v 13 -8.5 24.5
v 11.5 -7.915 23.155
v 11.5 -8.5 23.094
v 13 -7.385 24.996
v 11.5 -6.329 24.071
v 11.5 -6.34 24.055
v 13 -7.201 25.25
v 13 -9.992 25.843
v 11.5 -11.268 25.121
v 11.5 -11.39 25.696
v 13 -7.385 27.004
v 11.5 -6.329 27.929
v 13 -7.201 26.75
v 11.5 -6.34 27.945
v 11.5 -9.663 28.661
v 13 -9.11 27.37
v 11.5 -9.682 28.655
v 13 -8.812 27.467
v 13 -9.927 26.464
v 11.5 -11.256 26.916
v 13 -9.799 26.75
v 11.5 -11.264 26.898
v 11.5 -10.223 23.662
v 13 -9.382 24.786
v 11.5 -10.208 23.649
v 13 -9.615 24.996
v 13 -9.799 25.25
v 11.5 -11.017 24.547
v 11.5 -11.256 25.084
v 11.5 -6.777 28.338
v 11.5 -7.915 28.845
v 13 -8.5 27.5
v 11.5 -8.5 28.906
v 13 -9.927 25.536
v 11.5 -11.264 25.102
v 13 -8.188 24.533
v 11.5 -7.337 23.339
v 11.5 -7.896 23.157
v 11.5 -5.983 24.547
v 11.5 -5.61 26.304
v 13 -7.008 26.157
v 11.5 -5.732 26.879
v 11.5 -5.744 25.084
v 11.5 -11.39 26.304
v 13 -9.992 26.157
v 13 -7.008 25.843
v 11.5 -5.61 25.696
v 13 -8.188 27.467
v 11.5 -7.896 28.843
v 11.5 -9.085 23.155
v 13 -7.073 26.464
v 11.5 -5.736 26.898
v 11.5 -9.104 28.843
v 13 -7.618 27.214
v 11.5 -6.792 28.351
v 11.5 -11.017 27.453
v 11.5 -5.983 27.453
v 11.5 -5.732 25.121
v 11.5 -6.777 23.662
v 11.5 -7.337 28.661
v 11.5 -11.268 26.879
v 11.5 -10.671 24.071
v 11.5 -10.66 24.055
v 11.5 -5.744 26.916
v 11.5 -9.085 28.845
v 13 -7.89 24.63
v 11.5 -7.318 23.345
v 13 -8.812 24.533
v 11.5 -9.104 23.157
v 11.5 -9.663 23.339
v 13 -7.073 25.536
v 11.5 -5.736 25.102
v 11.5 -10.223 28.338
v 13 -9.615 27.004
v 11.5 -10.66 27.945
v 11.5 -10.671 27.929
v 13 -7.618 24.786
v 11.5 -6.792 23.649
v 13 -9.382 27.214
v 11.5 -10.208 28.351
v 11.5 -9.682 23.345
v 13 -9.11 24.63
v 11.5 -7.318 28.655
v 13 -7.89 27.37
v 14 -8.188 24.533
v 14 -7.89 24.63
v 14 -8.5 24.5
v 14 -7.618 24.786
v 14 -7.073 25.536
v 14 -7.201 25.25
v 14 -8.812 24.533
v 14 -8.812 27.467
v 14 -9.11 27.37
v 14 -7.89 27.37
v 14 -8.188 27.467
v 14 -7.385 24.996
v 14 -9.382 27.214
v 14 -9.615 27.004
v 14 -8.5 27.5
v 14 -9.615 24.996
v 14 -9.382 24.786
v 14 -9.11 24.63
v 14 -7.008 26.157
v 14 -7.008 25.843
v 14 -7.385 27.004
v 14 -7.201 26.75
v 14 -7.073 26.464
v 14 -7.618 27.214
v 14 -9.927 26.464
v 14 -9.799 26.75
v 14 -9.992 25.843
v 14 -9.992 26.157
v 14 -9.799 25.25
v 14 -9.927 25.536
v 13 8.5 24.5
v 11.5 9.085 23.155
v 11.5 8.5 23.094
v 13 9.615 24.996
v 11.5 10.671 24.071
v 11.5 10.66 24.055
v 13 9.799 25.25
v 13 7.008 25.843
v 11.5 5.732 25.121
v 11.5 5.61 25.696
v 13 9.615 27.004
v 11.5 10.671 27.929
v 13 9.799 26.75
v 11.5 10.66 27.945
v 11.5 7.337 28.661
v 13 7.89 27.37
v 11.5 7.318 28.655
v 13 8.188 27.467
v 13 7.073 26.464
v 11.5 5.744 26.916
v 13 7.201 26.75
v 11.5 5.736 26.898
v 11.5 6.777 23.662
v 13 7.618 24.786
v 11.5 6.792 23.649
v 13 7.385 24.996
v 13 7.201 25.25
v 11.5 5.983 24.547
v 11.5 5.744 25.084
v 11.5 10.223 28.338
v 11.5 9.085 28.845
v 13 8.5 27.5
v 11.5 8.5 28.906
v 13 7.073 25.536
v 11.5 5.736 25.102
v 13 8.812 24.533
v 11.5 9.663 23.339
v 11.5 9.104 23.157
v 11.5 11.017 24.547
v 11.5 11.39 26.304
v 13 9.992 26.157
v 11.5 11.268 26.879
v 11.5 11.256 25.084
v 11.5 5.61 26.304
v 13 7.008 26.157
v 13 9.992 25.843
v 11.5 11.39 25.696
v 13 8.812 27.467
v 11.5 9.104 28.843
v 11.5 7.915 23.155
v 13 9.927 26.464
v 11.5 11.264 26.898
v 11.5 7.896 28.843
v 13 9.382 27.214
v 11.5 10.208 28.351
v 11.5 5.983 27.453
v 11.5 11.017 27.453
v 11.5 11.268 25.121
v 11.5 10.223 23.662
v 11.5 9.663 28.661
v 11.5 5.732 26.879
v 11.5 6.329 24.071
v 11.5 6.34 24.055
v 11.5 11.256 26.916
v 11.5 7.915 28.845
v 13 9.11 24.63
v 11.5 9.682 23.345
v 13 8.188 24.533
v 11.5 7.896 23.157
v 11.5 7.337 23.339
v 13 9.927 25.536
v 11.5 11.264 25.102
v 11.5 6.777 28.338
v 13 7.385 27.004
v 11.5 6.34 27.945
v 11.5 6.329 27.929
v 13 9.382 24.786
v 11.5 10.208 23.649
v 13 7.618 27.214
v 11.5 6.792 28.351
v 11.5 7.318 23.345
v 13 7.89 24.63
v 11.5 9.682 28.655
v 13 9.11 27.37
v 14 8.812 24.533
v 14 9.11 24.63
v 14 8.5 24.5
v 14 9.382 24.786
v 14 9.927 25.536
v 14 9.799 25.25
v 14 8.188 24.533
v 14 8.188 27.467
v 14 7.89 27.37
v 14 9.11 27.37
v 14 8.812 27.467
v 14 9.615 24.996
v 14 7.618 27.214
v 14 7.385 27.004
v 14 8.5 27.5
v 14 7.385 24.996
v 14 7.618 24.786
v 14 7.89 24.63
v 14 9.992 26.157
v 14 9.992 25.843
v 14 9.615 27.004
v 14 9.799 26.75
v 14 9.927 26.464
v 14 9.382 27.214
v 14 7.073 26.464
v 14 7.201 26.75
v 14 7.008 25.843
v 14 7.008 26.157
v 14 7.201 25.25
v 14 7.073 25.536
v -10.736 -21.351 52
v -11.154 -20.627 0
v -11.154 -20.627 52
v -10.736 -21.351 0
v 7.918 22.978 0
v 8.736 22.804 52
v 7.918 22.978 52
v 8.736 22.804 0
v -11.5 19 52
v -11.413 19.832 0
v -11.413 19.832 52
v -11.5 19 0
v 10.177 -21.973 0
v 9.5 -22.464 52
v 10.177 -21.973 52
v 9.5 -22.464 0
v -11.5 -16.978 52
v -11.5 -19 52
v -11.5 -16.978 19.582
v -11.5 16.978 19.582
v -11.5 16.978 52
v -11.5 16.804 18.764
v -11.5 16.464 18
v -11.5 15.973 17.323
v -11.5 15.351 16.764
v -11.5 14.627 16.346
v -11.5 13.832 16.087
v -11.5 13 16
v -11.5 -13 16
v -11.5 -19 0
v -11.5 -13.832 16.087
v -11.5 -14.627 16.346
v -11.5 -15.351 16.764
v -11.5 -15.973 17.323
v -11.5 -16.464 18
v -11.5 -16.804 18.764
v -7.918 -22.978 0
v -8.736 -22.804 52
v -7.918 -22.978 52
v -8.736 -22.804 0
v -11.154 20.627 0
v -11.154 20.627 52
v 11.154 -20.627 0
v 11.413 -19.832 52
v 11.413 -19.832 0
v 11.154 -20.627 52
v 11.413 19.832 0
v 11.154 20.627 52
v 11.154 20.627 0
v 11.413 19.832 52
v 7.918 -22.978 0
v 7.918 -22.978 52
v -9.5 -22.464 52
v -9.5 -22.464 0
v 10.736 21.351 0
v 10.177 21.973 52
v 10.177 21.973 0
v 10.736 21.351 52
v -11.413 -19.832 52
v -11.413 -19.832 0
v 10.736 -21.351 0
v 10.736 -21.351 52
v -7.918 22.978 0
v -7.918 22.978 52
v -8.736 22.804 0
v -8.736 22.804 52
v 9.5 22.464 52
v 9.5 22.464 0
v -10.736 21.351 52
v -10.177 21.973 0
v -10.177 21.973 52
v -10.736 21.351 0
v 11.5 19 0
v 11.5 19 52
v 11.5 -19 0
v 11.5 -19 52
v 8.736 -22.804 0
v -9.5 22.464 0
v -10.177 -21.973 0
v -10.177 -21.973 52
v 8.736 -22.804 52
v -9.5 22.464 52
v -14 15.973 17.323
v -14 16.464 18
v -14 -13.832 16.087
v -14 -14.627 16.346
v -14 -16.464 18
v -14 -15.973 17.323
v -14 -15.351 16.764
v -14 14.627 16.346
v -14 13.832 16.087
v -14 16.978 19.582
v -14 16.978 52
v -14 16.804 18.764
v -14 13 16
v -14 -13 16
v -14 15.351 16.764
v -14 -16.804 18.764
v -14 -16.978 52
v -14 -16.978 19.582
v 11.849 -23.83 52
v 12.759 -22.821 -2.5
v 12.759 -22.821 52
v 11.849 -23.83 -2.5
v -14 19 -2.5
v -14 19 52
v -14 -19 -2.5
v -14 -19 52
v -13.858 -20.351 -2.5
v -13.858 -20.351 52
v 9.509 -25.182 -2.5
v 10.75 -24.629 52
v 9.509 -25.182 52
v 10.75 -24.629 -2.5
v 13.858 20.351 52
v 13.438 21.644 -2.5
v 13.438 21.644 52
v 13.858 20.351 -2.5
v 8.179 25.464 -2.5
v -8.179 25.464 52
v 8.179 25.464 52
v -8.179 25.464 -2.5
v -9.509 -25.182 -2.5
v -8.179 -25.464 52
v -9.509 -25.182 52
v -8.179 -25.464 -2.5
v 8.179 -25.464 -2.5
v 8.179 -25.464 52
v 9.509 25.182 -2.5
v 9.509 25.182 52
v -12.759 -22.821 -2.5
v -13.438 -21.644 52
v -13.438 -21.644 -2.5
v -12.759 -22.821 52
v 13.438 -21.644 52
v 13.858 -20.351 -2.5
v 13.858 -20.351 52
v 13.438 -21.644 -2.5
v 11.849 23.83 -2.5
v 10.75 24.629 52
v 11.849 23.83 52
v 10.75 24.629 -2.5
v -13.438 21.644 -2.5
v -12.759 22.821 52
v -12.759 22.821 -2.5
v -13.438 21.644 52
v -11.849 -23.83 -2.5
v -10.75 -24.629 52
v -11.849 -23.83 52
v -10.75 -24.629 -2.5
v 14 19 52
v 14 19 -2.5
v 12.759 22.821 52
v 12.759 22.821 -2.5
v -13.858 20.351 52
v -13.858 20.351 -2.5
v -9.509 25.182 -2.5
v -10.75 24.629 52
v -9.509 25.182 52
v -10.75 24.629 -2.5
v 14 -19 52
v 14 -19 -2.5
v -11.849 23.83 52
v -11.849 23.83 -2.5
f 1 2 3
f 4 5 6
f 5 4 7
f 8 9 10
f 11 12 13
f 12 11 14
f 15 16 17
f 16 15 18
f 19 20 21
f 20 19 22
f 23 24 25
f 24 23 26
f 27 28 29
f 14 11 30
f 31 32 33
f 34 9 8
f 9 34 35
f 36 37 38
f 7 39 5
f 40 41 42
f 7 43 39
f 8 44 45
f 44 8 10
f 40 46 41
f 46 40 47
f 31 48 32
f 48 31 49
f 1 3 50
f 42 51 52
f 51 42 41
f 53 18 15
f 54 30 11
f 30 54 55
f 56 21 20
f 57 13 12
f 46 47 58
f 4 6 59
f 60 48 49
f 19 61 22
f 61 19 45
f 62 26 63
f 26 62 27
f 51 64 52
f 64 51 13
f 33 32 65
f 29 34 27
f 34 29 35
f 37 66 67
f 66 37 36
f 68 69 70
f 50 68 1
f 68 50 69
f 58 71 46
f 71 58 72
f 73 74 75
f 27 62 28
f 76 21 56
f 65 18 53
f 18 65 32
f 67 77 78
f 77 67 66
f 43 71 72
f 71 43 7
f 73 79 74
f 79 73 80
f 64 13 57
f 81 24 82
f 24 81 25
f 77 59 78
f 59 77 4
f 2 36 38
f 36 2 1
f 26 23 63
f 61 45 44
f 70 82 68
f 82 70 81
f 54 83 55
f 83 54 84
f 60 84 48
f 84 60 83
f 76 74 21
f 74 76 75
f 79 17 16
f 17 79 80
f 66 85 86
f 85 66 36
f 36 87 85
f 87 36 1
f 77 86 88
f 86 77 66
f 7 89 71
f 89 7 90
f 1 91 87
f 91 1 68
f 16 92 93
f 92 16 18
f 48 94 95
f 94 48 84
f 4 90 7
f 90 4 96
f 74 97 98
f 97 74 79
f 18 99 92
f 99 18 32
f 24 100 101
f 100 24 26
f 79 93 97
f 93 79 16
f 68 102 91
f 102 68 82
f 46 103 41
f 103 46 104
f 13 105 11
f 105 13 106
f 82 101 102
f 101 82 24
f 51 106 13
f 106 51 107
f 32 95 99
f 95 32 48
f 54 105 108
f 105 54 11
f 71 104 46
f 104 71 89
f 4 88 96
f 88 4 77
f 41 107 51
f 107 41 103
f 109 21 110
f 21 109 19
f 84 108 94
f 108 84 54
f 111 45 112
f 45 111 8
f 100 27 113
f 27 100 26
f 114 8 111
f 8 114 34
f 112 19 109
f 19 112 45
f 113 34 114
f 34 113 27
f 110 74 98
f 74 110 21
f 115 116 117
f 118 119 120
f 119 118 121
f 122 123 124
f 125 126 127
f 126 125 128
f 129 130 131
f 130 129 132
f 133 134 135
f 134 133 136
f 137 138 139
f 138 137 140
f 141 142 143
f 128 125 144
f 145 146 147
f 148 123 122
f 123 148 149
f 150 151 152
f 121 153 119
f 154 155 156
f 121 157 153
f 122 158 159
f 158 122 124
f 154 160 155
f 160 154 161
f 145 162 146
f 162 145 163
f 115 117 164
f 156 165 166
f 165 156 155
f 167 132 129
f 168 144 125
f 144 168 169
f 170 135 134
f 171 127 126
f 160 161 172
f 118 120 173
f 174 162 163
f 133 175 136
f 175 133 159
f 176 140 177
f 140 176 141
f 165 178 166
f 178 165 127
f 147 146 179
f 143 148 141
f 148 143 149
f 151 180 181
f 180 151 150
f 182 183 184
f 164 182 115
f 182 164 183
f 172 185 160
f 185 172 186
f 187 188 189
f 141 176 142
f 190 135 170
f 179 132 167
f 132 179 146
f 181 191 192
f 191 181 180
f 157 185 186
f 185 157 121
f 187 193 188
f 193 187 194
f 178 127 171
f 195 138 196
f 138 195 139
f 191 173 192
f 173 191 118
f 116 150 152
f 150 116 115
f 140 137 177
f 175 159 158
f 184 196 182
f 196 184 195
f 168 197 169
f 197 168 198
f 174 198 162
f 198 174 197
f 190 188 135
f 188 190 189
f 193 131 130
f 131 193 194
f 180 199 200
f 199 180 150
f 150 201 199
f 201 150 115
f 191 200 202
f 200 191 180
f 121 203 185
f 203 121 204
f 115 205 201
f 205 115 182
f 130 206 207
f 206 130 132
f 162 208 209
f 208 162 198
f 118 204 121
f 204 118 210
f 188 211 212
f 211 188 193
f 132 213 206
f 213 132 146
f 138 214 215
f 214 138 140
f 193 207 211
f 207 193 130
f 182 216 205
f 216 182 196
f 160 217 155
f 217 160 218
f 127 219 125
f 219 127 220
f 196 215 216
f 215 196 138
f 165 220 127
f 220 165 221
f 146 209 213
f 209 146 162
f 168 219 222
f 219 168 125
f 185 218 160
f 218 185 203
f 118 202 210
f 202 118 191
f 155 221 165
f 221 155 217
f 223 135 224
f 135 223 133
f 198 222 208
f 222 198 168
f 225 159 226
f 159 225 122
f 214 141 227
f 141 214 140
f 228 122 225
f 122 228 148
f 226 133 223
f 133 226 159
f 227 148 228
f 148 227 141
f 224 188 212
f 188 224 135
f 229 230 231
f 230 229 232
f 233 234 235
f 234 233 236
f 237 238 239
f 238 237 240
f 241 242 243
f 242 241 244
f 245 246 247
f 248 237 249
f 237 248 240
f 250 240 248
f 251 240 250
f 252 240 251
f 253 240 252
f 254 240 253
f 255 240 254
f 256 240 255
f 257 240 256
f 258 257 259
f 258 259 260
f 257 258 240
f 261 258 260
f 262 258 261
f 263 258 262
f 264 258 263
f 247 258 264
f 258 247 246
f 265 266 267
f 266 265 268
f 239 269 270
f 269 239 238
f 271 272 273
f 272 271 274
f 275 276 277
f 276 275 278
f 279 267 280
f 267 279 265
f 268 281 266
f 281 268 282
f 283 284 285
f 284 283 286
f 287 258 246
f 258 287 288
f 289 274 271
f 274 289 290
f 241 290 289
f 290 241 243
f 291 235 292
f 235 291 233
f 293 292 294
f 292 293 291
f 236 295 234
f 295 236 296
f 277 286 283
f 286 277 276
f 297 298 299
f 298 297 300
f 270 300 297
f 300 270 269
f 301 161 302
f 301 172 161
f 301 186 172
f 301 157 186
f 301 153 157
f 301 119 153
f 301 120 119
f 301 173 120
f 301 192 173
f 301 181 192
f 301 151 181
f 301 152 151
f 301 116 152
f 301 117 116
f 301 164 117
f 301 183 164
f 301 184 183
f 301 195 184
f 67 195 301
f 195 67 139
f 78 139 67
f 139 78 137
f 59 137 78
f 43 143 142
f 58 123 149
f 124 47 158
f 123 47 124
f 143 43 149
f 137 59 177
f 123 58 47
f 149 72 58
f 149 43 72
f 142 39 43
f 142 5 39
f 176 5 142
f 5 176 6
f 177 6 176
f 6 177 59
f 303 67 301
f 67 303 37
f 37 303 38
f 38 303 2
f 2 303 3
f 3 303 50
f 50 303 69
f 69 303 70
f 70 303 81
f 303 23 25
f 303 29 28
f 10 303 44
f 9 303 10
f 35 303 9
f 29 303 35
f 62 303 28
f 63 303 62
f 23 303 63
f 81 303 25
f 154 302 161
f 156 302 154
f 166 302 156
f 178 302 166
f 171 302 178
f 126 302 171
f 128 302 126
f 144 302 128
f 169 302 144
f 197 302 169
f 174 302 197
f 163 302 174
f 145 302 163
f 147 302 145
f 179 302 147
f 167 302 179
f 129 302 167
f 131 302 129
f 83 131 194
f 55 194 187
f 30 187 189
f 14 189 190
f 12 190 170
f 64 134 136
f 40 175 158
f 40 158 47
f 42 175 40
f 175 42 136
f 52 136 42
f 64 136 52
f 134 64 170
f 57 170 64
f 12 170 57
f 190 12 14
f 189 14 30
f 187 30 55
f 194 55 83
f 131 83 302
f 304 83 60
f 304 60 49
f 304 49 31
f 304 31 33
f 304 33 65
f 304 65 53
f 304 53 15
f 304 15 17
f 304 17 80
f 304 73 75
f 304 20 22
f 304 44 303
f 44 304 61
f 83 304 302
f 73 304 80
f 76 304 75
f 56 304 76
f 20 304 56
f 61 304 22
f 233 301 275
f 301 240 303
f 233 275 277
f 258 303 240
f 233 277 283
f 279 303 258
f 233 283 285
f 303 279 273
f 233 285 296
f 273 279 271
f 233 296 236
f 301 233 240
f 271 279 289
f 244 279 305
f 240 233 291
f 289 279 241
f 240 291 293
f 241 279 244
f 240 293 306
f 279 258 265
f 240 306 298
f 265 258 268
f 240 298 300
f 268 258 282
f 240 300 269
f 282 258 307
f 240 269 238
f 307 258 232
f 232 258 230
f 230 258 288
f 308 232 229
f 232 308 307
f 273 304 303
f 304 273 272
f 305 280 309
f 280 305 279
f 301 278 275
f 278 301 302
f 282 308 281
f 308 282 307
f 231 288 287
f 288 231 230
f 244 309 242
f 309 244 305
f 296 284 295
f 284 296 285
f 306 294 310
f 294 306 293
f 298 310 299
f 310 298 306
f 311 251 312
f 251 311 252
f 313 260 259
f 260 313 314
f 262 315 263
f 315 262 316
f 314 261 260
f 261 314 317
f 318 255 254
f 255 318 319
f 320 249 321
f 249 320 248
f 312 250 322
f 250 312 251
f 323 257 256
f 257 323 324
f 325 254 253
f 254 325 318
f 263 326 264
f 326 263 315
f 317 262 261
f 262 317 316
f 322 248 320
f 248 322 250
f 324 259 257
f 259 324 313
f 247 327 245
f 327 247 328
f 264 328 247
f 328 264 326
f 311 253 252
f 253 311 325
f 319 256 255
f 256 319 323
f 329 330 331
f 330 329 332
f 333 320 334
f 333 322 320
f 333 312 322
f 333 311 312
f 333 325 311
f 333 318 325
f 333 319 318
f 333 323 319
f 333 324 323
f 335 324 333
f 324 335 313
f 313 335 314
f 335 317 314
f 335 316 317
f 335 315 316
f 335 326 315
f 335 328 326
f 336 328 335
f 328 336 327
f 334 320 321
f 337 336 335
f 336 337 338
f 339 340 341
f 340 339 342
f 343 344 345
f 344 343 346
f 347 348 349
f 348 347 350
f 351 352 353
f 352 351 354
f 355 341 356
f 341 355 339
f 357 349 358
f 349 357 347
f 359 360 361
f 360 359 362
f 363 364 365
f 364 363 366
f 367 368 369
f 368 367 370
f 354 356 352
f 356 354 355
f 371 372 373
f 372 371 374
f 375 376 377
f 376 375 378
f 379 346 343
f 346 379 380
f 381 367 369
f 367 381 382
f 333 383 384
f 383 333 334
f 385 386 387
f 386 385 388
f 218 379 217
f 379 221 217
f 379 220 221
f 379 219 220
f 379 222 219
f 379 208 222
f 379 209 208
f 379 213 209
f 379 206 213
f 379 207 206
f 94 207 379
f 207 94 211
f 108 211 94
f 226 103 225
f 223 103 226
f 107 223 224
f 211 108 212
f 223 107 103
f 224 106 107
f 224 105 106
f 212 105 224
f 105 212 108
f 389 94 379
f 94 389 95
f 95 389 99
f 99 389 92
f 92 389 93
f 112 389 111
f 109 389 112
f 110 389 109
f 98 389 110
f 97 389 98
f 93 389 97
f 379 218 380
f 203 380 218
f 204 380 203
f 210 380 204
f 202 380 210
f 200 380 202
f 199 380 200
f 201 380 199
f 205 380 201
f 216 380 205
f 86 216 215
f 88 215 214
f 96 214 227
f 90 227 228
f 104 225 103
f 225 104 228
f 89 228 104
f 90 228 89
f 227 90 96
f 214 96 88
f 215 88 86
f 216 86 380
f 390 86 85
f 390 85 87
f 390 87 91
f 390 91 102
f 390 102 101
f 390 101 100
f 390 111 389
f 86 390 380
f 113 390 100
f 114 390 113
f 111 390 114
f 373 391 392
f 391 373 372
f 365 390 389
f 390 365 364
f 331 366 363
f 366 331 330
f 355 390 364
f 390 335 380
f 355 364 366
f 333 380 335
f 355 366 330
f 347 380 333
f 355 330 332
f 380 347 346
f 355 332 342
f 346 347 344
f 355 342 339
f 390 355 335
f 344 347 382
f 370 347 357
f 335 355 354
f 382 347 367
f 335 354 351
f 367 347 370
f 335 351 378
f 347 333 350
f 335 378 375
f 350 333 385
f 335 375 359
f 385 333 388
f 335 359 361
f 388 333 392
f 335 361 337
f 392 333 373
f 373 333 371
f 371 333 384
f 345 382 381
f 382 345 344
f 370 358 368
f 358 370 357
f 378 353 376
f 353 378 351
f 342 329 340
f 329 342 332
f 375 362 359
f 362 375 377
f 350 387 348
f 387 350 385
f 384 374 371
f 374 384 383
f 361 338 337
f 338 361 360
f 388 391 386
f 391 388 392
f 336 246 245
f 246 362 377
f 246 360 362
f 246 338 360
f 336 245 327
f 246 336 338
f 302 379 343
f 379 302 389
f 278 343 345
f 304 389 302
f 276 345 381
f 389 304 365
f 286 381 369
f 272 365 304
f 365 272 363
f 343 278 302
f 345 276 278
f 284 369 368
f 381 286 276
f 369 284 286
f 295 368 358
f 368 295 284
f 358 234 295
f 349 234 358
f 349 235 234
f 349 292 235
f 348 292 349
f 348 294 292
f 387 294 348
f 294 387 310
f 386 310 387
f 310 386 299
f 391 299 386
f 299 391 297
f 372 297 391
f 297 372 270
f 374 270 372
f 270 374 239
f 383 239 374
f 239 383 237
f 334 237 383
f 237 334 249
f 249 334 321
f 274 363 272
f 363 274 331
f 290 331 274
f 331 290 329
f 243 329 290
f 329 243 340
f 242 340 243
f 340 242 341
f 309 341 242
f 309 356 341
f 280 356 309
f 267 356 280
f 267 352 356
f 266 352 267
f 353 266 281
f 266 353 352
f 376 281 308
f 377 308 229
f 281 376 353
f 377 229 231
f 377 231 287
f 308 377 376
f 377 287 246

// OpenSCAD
//
//  wall holder for aircond remote control
//
//  design by egil kvaleberg, 5 october 2016
//
part = "main"; // [ main ]

// size of compartment
comp_w = 46;
comp_d = 23;
comp_h = 52;
// width of front slot
slot_w = 34;
// width of slot lower lip
slot_lower = 16; 
// corner radius of compartment
corner_r = 4;
// wall thickness of comparement
wall = 2.5;
// chamfer for various holes
chamfer = 0.6;
// diameter of mounting screws
mnt_dia = 2.5;

// generic tolerance
tol = 0.25;

d = 1*0.1;

module add() {
    hull() for (sx = [-1,1]) for (sy = [-1,1]) 
        translate([sx*(comp_d/2-corner_r),sy*(comp_w/2-corner_r),-wall]) {
            cylinder(r=wall+corner_r, h=wall+comp_h, $fn=30);
        }     
}

module sub() {
    hull () for (sx = [-1,1]) for (sy = [-1,1]) 
        translate([sx*(comp_d/2-corner_r),sy*(comp_w/2-corner_r),0]) {
            cylinder(r=corner_r, h=comp_h+d, $fn=30);
    }
    // slot in front
    translate ([0,0,slot_lower+comp_h/2]) rotate([0,-90,0]) hull () for (sx = [-1,1]) for (sy = [-1,1]) 
        translate([sx*(comp_h/2-corner_r),sy*(slot_w/2-corner_r),0]) {
            cylinder(r=corner_r, h=comp_h+d, $fn=30);
    }
    // mounting holes
    translate ([comp_d/2-d,0,comp_h/2]) rotate([0,90,0]) for (sy = [-1,1]) 
        translate([0,sy*slot_w/4,0]) {
            cylinder(d1=mnt_dia+2*tol+2*wall*0.6, d2=mnt_dia+2*tol, h=d+wall*0.6, $fn=30);
            cylinder(d=mnt_dia+2*tol, h=d+wall+d, $fn=30);
    }   
}
    // mounting holes
    if (0) color("red") translate ([comp_d/2-d,0,comp_h/2]) rotate([0,90,0]) for (sy = [-1,1]) 
        translate([0,sy*slot_w/4,0]) {
            cylinder(d=mnt_dia+2*tol, h=d+wall+d, $fn=30);
    } 

    // main structure:
    difference () {
        color("red") add();
        difference () {
            sub();
            //
        }
    }
